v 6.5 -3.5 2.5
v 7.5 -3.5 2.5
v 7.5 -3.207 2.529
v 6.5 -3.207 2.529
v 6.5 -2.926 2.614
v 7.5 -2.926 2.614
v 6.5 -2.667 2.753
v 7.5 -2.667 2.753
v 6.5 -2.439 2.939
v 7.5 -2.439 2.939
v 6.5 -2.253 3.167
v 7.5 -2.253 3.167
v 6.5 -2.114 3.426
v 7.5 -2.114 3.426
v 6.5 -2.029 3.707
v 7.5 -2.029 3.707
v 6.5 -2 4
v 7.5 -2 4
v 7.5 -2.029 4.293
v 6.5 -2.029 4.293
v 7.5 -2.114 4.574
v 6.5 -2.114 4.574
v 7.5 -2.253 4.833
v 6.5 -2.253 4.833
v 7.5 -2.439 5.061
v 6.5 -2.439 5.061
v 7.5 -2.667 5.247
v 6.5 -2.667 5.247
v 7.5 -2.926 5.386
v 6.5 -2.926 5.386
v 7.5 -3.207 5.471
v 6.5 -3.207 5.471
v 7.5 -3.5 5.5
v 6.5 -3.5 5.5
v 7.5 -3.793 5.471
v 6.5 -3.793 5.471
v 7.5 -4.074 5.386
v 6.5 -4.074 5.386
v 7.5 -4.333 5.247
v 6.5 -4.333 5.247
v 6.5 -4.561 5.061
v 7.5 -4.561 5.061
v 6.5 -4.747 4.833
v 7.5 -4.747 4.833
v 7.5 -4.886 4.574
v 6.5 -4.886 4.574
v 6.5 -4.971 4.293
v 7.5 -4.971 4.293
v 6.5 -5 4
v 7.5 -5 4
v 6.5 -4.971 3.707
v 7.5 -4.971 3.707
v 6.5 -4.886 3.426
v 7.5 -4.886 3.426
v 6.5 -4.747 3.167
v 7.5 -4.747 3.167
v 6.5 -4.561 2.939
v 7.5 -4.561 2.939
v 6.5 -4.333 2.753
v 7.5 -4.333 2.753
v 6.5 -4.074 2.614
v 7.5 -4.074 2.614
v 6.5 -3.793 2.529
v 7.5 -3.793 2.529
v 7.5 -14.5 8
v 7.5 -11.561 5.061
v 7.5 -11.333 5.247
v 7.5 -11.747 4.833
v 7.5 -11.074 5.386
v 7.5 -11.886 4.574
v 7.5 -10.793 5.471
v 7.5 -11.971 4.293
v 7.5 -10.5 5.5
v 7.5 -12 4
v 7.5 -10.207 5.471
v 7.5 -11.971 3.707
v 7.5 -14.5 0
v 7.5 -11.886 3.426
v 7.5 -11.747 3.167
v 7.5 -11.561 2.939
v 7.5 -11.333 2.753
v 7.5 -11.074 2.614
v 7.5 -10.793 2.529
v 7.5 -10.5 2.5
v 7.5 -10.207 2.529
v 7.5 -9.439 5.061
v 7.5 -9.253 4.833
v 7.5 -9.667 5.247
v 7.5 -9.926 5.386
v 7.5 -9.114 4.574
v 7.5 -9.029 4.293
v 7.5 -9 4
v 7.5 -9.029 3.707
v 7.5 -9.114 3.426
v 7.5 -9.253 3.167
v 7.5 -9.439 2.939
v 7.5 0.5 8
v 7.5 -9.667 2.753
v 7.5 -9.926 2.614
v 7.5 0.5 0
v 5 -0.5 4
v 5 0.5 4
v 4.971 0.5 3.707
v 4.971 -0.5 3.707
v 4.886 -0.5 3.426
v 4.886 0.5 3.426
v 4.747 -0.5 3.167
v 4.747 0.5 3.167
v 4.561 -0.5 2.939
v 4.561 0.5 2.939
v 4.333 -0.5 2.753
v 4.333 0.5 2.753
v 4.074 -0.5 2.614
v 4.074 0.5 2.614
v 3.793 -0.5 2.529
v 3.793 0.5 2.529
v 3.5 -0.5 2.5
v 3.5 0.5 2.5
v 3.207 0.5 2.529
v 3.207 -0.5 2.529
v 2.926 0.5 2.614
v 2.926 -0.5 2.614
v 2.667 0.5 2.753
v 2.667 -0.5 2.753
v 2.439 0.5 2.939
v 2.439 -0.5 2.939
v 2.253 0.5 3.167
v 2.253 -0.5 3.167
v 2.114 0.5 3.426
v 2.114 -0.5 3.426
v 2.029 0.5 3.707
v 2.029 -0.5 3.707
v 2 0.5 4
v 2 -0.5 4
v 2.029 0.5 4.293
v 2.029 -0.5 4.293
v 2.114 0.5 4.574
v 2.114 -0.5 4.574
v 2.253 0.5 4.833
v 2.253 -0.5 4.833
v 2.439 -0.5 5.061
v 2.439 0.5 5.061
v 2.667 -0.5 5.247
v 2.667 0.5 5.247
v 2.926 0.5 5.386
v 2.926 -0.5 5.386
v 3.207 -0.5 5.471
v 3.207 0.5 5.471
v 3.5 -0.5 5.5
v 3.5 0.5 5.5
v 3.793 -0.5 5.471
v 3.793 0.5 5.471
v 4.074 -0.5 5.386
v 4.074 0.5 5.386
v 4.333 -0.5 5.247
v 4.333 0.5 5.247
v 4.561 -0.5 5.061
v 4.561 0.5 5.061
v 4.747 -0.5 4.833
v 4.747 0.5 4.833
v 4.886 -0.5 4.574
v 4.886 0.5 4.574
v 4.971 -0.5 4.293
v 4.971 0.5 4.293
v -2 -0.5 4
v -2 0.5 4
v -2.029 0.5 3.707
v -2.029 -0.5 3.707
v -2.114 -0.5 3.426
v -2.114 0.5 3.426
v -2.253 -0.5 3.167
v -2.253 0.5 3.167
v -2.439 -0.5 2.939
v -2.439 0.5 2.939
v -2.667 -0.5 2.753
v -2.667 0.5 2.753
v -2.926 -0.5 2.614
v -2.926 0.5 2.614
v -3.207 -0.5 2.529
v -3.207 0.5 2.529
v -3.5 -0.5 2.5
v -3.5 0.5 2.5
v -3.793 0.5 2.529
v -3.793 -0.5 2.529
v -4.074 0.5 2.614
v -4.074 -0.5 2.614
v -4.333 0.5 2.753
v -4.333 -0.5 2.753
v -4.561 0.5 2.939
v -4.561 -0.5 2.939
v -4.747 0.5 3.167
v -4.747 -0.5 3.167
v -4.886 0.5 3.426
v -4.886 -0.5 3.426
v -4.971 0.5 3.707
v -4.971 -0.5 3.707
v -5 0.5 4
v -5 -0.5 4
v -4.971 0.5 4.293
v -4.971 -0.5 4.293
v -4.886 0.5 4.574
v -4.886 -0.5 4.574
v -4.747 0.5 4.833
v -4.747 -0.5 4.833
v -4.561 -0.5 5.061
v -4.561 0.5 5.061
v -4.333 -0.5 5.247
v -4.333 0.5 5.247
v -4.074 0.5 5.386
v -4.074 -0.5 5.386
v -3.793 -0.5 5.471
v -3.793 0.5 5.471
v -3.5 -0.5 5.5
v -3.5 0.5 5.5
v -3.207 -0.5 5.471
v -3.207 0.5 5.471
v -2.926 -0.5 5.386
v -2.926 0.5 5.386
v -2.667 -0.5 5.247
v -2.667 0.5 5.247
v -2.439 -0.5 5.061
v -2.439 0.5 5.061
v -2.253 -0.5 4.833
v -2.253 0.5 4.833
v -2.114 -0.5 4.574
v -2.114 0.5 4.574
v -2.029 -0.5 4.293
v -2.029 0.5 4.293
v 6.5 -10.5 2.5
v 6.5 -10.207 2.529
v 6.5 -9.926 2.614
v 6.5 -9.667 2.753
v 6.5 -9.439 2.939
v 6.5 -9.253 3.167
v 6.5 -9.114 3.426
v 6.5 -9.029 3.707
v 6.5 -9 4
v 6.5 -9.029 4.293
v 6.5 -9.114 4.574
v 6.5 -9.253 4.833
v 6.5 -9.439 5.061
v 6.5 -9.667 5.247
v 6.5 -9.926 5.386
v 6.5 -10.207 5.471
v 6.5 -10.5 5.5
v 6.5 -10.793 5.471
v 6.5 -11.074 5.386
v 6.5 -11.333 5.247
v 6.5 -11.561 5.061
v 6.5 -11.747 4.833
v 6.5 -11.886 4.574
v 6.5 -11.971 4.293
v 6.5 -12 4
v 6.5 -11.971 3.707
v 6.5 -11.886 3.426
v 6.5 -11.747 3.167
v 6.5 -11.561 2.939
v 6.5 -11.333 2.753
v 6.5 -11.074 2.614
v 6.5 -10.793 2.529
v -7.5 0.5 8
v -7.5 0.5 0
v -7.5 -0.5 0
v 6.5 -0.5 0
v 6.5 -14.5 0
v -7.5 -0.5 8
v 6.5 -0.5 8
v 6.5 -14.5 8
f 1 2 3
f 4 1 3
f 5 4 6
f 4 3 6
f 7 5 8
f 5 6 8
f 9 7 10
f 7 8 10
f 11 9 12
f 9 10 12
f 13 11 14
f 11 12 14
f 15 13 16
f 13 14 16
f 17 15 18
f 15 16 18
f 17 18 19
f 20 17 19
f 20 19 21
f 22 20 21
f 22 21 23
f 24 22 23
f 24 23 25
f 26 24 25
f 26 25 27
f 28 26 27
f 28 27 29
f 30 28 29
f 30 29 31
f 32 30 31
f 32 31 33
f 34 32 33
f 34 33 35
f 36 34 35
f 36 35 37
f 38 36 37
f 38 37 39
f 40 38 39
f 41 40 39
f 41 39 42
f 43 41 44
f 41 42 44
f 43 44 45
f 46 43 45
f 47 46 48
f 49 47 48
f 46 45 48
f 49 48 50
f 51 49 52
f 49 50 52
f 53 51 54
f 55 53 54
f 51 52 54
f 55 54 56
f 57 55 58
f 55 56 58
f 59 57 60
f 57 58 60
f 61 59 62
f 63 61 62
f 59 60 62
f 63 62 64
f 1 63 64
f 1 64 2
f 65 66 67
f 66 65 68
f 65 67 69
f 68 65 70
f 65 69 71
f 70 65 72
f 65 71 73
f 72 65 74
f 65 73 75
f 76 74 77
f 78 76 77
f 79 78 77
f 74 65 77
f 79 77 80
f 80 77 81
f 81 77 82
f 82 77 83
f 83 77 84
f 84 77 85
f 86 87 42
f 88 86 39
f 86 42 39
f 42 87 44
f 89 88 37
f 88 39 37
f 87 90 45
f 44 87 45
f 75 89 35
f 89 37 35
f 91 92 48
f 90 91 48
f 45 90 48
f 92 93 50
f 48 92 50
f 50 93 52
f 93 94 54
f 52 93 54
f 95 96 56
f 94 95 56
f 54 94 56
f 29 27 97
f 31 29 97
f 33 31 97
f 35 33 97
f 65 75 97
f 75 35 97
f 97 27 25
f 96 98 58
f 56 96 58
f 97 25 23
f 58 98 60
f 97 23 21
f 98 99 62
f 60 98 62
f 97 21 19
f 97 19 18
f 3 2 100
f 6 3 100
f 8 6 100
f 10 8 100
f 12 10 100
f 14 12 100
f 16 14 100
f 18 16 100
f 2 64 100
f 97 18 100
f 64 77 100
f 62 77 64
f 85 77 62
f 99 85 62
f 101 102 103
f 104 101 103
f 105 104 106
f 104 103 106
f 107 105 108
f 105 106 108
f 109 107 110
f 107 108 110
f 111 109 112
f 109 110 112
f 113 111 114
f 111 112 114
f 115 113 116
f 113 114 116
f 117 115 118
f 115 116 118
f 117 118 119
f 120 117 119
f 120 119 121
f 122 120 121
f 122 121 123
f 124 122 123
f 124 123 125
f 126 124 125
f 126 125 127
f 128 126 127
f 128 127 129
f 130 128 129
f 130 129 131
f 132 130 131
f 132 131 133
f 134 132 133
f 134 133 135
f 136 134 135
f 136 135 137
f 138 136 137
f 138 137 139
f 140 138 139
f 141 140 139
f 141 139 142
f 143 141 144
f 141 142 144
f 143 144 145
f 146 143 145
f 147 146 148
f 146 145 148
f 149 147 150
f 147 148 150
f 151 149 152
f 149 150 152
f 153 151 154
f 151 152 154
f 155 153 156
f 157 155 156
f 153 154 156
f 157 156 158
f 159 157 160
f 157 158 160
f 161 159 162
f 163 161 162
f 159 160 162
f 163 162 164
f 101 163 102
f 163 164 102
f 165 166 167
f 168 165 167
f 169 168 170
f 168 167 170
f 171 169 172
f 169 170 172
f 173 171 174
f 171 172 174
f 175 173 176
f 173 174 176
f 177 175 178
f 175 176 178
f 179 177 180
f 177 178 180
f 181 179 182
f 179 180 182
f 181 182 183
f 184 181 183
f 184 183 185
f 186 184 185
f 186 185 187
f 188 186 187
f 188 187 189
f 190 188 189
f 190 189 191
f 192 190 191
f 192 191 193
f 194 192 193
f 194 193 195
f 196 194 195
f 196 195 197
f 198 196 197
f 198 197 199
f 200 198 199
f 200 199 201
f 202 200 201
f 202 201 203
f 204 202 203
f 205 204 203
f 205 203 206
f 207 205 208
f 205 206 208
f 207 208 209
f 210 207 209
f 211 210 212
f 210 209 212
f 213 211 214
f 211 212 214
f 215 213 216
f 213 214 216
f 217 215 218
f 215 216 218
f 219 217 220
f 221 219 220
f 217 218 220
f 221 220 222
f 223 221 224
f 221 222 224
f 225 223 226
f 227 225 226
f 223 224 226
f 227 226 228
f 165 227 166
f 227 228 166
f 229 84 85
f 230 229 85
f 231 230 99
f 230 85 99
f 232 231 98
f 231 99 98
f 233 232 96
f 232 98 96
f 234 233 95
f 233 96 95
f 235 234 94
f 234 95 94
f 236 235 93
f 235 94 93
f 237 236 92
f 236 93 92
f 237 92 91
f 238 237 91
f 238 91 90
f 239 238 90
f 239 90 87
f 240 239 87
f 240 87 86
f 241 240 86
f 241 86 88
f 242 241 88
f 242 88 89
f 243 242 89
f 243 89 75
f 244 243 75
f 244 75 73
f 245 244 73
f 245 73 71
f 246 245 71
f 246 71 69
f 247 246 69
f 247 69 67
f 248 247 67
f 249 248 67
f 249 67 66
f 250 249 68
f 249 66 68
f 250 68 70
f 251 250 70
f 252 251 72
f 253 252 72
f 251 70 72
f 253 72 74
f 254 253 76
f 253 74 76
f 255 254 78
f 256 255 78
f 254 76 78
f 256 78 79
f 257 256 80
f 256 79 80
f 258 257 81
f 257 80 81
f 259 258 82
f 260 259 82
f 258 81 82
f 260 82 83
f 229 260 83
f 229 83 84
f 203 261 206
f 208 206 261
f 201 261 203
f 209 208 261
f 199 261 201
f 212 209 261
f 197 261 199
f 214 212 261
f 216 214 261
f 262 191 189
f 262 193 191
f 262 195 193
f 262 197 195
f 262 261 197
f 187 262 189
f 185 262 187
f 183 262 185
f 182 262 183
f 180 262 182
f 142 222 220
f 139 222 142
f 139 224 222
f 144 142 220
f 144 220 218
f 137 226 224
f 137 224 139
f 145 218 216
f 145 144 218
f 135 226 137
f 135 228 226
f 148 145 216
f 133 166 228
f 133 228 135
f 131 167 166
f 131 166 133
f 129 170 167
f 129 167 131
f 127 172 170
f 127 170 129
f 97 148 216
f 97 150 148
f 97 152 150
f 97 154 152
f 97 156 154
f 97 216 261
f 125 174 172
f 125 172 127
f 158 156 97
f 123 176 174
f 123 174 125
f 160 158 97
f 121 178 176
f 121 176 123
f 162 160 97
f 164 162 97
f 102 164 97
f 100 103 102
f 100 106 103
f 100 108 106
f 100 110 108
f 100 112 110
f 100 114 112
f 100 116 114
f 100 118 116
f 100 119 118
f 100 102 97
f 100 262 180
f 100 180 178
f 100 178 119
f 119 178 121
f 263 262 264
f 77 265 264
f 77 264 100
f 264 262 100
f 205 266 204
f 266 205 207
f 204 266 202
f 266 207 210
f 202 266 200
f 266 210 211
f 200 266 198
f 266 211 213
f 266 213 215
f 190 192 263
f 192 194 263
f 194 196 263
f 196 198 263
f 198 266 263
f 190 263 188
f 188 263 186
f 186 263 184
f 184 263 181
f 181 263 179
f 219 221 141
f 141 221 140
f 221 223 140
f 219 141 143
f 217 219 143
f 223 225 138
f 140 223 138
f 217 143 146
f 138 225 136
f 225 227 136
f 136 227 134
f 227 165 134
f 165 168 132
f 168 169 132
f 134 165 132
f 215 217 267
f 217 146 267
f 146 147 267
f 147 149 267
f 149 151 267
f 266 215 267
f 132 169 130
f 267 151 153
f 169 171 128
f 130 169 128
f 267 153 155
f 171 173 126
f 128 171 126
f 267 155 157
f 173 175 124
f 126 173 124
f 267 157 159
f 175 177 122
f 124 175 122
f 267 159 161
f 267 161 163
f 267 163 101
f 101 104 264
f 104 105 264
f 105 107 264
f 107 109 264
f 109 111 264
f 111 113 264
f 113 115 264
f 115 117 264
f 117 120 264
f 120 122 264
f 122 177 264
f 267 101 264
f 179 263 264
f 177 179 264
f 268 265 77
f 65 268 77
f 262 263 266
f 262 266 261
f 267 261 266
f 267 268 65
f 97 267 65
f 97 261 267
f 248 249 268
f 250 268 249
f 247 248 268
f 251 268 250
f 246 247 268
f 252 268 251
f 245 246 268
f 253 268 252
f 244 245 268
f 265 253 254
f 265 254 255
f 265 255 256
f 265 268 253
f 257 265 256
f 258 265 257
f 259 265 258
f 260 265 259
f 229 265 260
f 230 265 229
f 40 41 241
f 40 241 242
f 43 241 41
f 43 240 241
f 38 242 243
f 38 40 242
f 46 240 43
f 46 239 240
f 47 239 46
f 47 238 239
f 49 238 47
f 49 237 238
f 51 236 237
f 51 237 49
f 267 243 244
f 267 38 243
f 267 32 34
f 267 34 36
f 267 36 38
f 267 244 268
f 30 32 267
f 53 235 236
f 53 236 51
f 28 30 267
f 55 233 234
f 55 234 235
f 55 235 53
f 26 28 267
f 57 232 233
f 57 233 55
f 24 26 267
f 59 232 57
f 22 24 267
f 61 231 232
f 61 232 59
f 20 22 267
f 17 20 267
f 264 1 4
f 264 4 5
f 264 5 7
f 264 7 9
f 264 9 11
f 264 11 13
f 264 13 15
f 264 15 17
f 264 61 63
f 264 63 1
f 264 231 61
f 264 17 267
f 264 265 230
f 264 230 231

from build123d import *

# Parameters (mm, degrees)
SKETCH1_W           = 15
SKETCH1_H           = 1
SKETCH1_W_2         = 1
SKETCH1_H_2         = 14
BOSS_EXTRUDE1_DEPTH = 8
SKETCH2_R           = 1.5
CUT_EXTRUDE1_DEPTH  = 16
SKETCH3_R           = 1.5
CUT_EXTRUDE2_DEPTH  = 16


with BuildPart() as part:
    # Sketch1 → Boss-Extrude1 (new body)
    with BuildSketch(Plane.XY):
        Rectangle(SKETCH1_W, SKETCH1_H)
        with Locations((7, -7.5)):
            Rectangle(SKETCH1_W_2, SKETCH1_H_2)
    extrude(amount=BOSS_EXTRUDE1_DEPTH)

    # Sketch2 → Cut-Extrude1 (cut, through all)
    with BuildSketch(Plane(origin=(0, 0.5, 0), x_dir=(1, 0, 0), z_dir=(0, 1, 0))):
        with Locations((-3.5, -4)):
            Circle(SKETCH2_R)
        with Locations((3.5, -4)):
            Circle(SKETCH2_R)
    extrude(amount=-CUT_EXTRUDE1_DEPTH, mode=Mode.SUBTRACT)

    # Sketch3 → Cut-Extrude2 (cut, through all)
    with BuildSketch(Plane(origin=(7.5, 0, 0), x_dir=(0, 0, -1), z_dir=(1, 0, 0))):
        with Locations((-4, -3.5)):
            Circle(SKETCH3_R)
        with Locations((-4, -10.5)):
            Circle(SKETCH3_R)
    extrude(amount=-CUT_EXTRUDE2_DEPTH, mode=Mode.SUBTRACT)


solid = part.part
